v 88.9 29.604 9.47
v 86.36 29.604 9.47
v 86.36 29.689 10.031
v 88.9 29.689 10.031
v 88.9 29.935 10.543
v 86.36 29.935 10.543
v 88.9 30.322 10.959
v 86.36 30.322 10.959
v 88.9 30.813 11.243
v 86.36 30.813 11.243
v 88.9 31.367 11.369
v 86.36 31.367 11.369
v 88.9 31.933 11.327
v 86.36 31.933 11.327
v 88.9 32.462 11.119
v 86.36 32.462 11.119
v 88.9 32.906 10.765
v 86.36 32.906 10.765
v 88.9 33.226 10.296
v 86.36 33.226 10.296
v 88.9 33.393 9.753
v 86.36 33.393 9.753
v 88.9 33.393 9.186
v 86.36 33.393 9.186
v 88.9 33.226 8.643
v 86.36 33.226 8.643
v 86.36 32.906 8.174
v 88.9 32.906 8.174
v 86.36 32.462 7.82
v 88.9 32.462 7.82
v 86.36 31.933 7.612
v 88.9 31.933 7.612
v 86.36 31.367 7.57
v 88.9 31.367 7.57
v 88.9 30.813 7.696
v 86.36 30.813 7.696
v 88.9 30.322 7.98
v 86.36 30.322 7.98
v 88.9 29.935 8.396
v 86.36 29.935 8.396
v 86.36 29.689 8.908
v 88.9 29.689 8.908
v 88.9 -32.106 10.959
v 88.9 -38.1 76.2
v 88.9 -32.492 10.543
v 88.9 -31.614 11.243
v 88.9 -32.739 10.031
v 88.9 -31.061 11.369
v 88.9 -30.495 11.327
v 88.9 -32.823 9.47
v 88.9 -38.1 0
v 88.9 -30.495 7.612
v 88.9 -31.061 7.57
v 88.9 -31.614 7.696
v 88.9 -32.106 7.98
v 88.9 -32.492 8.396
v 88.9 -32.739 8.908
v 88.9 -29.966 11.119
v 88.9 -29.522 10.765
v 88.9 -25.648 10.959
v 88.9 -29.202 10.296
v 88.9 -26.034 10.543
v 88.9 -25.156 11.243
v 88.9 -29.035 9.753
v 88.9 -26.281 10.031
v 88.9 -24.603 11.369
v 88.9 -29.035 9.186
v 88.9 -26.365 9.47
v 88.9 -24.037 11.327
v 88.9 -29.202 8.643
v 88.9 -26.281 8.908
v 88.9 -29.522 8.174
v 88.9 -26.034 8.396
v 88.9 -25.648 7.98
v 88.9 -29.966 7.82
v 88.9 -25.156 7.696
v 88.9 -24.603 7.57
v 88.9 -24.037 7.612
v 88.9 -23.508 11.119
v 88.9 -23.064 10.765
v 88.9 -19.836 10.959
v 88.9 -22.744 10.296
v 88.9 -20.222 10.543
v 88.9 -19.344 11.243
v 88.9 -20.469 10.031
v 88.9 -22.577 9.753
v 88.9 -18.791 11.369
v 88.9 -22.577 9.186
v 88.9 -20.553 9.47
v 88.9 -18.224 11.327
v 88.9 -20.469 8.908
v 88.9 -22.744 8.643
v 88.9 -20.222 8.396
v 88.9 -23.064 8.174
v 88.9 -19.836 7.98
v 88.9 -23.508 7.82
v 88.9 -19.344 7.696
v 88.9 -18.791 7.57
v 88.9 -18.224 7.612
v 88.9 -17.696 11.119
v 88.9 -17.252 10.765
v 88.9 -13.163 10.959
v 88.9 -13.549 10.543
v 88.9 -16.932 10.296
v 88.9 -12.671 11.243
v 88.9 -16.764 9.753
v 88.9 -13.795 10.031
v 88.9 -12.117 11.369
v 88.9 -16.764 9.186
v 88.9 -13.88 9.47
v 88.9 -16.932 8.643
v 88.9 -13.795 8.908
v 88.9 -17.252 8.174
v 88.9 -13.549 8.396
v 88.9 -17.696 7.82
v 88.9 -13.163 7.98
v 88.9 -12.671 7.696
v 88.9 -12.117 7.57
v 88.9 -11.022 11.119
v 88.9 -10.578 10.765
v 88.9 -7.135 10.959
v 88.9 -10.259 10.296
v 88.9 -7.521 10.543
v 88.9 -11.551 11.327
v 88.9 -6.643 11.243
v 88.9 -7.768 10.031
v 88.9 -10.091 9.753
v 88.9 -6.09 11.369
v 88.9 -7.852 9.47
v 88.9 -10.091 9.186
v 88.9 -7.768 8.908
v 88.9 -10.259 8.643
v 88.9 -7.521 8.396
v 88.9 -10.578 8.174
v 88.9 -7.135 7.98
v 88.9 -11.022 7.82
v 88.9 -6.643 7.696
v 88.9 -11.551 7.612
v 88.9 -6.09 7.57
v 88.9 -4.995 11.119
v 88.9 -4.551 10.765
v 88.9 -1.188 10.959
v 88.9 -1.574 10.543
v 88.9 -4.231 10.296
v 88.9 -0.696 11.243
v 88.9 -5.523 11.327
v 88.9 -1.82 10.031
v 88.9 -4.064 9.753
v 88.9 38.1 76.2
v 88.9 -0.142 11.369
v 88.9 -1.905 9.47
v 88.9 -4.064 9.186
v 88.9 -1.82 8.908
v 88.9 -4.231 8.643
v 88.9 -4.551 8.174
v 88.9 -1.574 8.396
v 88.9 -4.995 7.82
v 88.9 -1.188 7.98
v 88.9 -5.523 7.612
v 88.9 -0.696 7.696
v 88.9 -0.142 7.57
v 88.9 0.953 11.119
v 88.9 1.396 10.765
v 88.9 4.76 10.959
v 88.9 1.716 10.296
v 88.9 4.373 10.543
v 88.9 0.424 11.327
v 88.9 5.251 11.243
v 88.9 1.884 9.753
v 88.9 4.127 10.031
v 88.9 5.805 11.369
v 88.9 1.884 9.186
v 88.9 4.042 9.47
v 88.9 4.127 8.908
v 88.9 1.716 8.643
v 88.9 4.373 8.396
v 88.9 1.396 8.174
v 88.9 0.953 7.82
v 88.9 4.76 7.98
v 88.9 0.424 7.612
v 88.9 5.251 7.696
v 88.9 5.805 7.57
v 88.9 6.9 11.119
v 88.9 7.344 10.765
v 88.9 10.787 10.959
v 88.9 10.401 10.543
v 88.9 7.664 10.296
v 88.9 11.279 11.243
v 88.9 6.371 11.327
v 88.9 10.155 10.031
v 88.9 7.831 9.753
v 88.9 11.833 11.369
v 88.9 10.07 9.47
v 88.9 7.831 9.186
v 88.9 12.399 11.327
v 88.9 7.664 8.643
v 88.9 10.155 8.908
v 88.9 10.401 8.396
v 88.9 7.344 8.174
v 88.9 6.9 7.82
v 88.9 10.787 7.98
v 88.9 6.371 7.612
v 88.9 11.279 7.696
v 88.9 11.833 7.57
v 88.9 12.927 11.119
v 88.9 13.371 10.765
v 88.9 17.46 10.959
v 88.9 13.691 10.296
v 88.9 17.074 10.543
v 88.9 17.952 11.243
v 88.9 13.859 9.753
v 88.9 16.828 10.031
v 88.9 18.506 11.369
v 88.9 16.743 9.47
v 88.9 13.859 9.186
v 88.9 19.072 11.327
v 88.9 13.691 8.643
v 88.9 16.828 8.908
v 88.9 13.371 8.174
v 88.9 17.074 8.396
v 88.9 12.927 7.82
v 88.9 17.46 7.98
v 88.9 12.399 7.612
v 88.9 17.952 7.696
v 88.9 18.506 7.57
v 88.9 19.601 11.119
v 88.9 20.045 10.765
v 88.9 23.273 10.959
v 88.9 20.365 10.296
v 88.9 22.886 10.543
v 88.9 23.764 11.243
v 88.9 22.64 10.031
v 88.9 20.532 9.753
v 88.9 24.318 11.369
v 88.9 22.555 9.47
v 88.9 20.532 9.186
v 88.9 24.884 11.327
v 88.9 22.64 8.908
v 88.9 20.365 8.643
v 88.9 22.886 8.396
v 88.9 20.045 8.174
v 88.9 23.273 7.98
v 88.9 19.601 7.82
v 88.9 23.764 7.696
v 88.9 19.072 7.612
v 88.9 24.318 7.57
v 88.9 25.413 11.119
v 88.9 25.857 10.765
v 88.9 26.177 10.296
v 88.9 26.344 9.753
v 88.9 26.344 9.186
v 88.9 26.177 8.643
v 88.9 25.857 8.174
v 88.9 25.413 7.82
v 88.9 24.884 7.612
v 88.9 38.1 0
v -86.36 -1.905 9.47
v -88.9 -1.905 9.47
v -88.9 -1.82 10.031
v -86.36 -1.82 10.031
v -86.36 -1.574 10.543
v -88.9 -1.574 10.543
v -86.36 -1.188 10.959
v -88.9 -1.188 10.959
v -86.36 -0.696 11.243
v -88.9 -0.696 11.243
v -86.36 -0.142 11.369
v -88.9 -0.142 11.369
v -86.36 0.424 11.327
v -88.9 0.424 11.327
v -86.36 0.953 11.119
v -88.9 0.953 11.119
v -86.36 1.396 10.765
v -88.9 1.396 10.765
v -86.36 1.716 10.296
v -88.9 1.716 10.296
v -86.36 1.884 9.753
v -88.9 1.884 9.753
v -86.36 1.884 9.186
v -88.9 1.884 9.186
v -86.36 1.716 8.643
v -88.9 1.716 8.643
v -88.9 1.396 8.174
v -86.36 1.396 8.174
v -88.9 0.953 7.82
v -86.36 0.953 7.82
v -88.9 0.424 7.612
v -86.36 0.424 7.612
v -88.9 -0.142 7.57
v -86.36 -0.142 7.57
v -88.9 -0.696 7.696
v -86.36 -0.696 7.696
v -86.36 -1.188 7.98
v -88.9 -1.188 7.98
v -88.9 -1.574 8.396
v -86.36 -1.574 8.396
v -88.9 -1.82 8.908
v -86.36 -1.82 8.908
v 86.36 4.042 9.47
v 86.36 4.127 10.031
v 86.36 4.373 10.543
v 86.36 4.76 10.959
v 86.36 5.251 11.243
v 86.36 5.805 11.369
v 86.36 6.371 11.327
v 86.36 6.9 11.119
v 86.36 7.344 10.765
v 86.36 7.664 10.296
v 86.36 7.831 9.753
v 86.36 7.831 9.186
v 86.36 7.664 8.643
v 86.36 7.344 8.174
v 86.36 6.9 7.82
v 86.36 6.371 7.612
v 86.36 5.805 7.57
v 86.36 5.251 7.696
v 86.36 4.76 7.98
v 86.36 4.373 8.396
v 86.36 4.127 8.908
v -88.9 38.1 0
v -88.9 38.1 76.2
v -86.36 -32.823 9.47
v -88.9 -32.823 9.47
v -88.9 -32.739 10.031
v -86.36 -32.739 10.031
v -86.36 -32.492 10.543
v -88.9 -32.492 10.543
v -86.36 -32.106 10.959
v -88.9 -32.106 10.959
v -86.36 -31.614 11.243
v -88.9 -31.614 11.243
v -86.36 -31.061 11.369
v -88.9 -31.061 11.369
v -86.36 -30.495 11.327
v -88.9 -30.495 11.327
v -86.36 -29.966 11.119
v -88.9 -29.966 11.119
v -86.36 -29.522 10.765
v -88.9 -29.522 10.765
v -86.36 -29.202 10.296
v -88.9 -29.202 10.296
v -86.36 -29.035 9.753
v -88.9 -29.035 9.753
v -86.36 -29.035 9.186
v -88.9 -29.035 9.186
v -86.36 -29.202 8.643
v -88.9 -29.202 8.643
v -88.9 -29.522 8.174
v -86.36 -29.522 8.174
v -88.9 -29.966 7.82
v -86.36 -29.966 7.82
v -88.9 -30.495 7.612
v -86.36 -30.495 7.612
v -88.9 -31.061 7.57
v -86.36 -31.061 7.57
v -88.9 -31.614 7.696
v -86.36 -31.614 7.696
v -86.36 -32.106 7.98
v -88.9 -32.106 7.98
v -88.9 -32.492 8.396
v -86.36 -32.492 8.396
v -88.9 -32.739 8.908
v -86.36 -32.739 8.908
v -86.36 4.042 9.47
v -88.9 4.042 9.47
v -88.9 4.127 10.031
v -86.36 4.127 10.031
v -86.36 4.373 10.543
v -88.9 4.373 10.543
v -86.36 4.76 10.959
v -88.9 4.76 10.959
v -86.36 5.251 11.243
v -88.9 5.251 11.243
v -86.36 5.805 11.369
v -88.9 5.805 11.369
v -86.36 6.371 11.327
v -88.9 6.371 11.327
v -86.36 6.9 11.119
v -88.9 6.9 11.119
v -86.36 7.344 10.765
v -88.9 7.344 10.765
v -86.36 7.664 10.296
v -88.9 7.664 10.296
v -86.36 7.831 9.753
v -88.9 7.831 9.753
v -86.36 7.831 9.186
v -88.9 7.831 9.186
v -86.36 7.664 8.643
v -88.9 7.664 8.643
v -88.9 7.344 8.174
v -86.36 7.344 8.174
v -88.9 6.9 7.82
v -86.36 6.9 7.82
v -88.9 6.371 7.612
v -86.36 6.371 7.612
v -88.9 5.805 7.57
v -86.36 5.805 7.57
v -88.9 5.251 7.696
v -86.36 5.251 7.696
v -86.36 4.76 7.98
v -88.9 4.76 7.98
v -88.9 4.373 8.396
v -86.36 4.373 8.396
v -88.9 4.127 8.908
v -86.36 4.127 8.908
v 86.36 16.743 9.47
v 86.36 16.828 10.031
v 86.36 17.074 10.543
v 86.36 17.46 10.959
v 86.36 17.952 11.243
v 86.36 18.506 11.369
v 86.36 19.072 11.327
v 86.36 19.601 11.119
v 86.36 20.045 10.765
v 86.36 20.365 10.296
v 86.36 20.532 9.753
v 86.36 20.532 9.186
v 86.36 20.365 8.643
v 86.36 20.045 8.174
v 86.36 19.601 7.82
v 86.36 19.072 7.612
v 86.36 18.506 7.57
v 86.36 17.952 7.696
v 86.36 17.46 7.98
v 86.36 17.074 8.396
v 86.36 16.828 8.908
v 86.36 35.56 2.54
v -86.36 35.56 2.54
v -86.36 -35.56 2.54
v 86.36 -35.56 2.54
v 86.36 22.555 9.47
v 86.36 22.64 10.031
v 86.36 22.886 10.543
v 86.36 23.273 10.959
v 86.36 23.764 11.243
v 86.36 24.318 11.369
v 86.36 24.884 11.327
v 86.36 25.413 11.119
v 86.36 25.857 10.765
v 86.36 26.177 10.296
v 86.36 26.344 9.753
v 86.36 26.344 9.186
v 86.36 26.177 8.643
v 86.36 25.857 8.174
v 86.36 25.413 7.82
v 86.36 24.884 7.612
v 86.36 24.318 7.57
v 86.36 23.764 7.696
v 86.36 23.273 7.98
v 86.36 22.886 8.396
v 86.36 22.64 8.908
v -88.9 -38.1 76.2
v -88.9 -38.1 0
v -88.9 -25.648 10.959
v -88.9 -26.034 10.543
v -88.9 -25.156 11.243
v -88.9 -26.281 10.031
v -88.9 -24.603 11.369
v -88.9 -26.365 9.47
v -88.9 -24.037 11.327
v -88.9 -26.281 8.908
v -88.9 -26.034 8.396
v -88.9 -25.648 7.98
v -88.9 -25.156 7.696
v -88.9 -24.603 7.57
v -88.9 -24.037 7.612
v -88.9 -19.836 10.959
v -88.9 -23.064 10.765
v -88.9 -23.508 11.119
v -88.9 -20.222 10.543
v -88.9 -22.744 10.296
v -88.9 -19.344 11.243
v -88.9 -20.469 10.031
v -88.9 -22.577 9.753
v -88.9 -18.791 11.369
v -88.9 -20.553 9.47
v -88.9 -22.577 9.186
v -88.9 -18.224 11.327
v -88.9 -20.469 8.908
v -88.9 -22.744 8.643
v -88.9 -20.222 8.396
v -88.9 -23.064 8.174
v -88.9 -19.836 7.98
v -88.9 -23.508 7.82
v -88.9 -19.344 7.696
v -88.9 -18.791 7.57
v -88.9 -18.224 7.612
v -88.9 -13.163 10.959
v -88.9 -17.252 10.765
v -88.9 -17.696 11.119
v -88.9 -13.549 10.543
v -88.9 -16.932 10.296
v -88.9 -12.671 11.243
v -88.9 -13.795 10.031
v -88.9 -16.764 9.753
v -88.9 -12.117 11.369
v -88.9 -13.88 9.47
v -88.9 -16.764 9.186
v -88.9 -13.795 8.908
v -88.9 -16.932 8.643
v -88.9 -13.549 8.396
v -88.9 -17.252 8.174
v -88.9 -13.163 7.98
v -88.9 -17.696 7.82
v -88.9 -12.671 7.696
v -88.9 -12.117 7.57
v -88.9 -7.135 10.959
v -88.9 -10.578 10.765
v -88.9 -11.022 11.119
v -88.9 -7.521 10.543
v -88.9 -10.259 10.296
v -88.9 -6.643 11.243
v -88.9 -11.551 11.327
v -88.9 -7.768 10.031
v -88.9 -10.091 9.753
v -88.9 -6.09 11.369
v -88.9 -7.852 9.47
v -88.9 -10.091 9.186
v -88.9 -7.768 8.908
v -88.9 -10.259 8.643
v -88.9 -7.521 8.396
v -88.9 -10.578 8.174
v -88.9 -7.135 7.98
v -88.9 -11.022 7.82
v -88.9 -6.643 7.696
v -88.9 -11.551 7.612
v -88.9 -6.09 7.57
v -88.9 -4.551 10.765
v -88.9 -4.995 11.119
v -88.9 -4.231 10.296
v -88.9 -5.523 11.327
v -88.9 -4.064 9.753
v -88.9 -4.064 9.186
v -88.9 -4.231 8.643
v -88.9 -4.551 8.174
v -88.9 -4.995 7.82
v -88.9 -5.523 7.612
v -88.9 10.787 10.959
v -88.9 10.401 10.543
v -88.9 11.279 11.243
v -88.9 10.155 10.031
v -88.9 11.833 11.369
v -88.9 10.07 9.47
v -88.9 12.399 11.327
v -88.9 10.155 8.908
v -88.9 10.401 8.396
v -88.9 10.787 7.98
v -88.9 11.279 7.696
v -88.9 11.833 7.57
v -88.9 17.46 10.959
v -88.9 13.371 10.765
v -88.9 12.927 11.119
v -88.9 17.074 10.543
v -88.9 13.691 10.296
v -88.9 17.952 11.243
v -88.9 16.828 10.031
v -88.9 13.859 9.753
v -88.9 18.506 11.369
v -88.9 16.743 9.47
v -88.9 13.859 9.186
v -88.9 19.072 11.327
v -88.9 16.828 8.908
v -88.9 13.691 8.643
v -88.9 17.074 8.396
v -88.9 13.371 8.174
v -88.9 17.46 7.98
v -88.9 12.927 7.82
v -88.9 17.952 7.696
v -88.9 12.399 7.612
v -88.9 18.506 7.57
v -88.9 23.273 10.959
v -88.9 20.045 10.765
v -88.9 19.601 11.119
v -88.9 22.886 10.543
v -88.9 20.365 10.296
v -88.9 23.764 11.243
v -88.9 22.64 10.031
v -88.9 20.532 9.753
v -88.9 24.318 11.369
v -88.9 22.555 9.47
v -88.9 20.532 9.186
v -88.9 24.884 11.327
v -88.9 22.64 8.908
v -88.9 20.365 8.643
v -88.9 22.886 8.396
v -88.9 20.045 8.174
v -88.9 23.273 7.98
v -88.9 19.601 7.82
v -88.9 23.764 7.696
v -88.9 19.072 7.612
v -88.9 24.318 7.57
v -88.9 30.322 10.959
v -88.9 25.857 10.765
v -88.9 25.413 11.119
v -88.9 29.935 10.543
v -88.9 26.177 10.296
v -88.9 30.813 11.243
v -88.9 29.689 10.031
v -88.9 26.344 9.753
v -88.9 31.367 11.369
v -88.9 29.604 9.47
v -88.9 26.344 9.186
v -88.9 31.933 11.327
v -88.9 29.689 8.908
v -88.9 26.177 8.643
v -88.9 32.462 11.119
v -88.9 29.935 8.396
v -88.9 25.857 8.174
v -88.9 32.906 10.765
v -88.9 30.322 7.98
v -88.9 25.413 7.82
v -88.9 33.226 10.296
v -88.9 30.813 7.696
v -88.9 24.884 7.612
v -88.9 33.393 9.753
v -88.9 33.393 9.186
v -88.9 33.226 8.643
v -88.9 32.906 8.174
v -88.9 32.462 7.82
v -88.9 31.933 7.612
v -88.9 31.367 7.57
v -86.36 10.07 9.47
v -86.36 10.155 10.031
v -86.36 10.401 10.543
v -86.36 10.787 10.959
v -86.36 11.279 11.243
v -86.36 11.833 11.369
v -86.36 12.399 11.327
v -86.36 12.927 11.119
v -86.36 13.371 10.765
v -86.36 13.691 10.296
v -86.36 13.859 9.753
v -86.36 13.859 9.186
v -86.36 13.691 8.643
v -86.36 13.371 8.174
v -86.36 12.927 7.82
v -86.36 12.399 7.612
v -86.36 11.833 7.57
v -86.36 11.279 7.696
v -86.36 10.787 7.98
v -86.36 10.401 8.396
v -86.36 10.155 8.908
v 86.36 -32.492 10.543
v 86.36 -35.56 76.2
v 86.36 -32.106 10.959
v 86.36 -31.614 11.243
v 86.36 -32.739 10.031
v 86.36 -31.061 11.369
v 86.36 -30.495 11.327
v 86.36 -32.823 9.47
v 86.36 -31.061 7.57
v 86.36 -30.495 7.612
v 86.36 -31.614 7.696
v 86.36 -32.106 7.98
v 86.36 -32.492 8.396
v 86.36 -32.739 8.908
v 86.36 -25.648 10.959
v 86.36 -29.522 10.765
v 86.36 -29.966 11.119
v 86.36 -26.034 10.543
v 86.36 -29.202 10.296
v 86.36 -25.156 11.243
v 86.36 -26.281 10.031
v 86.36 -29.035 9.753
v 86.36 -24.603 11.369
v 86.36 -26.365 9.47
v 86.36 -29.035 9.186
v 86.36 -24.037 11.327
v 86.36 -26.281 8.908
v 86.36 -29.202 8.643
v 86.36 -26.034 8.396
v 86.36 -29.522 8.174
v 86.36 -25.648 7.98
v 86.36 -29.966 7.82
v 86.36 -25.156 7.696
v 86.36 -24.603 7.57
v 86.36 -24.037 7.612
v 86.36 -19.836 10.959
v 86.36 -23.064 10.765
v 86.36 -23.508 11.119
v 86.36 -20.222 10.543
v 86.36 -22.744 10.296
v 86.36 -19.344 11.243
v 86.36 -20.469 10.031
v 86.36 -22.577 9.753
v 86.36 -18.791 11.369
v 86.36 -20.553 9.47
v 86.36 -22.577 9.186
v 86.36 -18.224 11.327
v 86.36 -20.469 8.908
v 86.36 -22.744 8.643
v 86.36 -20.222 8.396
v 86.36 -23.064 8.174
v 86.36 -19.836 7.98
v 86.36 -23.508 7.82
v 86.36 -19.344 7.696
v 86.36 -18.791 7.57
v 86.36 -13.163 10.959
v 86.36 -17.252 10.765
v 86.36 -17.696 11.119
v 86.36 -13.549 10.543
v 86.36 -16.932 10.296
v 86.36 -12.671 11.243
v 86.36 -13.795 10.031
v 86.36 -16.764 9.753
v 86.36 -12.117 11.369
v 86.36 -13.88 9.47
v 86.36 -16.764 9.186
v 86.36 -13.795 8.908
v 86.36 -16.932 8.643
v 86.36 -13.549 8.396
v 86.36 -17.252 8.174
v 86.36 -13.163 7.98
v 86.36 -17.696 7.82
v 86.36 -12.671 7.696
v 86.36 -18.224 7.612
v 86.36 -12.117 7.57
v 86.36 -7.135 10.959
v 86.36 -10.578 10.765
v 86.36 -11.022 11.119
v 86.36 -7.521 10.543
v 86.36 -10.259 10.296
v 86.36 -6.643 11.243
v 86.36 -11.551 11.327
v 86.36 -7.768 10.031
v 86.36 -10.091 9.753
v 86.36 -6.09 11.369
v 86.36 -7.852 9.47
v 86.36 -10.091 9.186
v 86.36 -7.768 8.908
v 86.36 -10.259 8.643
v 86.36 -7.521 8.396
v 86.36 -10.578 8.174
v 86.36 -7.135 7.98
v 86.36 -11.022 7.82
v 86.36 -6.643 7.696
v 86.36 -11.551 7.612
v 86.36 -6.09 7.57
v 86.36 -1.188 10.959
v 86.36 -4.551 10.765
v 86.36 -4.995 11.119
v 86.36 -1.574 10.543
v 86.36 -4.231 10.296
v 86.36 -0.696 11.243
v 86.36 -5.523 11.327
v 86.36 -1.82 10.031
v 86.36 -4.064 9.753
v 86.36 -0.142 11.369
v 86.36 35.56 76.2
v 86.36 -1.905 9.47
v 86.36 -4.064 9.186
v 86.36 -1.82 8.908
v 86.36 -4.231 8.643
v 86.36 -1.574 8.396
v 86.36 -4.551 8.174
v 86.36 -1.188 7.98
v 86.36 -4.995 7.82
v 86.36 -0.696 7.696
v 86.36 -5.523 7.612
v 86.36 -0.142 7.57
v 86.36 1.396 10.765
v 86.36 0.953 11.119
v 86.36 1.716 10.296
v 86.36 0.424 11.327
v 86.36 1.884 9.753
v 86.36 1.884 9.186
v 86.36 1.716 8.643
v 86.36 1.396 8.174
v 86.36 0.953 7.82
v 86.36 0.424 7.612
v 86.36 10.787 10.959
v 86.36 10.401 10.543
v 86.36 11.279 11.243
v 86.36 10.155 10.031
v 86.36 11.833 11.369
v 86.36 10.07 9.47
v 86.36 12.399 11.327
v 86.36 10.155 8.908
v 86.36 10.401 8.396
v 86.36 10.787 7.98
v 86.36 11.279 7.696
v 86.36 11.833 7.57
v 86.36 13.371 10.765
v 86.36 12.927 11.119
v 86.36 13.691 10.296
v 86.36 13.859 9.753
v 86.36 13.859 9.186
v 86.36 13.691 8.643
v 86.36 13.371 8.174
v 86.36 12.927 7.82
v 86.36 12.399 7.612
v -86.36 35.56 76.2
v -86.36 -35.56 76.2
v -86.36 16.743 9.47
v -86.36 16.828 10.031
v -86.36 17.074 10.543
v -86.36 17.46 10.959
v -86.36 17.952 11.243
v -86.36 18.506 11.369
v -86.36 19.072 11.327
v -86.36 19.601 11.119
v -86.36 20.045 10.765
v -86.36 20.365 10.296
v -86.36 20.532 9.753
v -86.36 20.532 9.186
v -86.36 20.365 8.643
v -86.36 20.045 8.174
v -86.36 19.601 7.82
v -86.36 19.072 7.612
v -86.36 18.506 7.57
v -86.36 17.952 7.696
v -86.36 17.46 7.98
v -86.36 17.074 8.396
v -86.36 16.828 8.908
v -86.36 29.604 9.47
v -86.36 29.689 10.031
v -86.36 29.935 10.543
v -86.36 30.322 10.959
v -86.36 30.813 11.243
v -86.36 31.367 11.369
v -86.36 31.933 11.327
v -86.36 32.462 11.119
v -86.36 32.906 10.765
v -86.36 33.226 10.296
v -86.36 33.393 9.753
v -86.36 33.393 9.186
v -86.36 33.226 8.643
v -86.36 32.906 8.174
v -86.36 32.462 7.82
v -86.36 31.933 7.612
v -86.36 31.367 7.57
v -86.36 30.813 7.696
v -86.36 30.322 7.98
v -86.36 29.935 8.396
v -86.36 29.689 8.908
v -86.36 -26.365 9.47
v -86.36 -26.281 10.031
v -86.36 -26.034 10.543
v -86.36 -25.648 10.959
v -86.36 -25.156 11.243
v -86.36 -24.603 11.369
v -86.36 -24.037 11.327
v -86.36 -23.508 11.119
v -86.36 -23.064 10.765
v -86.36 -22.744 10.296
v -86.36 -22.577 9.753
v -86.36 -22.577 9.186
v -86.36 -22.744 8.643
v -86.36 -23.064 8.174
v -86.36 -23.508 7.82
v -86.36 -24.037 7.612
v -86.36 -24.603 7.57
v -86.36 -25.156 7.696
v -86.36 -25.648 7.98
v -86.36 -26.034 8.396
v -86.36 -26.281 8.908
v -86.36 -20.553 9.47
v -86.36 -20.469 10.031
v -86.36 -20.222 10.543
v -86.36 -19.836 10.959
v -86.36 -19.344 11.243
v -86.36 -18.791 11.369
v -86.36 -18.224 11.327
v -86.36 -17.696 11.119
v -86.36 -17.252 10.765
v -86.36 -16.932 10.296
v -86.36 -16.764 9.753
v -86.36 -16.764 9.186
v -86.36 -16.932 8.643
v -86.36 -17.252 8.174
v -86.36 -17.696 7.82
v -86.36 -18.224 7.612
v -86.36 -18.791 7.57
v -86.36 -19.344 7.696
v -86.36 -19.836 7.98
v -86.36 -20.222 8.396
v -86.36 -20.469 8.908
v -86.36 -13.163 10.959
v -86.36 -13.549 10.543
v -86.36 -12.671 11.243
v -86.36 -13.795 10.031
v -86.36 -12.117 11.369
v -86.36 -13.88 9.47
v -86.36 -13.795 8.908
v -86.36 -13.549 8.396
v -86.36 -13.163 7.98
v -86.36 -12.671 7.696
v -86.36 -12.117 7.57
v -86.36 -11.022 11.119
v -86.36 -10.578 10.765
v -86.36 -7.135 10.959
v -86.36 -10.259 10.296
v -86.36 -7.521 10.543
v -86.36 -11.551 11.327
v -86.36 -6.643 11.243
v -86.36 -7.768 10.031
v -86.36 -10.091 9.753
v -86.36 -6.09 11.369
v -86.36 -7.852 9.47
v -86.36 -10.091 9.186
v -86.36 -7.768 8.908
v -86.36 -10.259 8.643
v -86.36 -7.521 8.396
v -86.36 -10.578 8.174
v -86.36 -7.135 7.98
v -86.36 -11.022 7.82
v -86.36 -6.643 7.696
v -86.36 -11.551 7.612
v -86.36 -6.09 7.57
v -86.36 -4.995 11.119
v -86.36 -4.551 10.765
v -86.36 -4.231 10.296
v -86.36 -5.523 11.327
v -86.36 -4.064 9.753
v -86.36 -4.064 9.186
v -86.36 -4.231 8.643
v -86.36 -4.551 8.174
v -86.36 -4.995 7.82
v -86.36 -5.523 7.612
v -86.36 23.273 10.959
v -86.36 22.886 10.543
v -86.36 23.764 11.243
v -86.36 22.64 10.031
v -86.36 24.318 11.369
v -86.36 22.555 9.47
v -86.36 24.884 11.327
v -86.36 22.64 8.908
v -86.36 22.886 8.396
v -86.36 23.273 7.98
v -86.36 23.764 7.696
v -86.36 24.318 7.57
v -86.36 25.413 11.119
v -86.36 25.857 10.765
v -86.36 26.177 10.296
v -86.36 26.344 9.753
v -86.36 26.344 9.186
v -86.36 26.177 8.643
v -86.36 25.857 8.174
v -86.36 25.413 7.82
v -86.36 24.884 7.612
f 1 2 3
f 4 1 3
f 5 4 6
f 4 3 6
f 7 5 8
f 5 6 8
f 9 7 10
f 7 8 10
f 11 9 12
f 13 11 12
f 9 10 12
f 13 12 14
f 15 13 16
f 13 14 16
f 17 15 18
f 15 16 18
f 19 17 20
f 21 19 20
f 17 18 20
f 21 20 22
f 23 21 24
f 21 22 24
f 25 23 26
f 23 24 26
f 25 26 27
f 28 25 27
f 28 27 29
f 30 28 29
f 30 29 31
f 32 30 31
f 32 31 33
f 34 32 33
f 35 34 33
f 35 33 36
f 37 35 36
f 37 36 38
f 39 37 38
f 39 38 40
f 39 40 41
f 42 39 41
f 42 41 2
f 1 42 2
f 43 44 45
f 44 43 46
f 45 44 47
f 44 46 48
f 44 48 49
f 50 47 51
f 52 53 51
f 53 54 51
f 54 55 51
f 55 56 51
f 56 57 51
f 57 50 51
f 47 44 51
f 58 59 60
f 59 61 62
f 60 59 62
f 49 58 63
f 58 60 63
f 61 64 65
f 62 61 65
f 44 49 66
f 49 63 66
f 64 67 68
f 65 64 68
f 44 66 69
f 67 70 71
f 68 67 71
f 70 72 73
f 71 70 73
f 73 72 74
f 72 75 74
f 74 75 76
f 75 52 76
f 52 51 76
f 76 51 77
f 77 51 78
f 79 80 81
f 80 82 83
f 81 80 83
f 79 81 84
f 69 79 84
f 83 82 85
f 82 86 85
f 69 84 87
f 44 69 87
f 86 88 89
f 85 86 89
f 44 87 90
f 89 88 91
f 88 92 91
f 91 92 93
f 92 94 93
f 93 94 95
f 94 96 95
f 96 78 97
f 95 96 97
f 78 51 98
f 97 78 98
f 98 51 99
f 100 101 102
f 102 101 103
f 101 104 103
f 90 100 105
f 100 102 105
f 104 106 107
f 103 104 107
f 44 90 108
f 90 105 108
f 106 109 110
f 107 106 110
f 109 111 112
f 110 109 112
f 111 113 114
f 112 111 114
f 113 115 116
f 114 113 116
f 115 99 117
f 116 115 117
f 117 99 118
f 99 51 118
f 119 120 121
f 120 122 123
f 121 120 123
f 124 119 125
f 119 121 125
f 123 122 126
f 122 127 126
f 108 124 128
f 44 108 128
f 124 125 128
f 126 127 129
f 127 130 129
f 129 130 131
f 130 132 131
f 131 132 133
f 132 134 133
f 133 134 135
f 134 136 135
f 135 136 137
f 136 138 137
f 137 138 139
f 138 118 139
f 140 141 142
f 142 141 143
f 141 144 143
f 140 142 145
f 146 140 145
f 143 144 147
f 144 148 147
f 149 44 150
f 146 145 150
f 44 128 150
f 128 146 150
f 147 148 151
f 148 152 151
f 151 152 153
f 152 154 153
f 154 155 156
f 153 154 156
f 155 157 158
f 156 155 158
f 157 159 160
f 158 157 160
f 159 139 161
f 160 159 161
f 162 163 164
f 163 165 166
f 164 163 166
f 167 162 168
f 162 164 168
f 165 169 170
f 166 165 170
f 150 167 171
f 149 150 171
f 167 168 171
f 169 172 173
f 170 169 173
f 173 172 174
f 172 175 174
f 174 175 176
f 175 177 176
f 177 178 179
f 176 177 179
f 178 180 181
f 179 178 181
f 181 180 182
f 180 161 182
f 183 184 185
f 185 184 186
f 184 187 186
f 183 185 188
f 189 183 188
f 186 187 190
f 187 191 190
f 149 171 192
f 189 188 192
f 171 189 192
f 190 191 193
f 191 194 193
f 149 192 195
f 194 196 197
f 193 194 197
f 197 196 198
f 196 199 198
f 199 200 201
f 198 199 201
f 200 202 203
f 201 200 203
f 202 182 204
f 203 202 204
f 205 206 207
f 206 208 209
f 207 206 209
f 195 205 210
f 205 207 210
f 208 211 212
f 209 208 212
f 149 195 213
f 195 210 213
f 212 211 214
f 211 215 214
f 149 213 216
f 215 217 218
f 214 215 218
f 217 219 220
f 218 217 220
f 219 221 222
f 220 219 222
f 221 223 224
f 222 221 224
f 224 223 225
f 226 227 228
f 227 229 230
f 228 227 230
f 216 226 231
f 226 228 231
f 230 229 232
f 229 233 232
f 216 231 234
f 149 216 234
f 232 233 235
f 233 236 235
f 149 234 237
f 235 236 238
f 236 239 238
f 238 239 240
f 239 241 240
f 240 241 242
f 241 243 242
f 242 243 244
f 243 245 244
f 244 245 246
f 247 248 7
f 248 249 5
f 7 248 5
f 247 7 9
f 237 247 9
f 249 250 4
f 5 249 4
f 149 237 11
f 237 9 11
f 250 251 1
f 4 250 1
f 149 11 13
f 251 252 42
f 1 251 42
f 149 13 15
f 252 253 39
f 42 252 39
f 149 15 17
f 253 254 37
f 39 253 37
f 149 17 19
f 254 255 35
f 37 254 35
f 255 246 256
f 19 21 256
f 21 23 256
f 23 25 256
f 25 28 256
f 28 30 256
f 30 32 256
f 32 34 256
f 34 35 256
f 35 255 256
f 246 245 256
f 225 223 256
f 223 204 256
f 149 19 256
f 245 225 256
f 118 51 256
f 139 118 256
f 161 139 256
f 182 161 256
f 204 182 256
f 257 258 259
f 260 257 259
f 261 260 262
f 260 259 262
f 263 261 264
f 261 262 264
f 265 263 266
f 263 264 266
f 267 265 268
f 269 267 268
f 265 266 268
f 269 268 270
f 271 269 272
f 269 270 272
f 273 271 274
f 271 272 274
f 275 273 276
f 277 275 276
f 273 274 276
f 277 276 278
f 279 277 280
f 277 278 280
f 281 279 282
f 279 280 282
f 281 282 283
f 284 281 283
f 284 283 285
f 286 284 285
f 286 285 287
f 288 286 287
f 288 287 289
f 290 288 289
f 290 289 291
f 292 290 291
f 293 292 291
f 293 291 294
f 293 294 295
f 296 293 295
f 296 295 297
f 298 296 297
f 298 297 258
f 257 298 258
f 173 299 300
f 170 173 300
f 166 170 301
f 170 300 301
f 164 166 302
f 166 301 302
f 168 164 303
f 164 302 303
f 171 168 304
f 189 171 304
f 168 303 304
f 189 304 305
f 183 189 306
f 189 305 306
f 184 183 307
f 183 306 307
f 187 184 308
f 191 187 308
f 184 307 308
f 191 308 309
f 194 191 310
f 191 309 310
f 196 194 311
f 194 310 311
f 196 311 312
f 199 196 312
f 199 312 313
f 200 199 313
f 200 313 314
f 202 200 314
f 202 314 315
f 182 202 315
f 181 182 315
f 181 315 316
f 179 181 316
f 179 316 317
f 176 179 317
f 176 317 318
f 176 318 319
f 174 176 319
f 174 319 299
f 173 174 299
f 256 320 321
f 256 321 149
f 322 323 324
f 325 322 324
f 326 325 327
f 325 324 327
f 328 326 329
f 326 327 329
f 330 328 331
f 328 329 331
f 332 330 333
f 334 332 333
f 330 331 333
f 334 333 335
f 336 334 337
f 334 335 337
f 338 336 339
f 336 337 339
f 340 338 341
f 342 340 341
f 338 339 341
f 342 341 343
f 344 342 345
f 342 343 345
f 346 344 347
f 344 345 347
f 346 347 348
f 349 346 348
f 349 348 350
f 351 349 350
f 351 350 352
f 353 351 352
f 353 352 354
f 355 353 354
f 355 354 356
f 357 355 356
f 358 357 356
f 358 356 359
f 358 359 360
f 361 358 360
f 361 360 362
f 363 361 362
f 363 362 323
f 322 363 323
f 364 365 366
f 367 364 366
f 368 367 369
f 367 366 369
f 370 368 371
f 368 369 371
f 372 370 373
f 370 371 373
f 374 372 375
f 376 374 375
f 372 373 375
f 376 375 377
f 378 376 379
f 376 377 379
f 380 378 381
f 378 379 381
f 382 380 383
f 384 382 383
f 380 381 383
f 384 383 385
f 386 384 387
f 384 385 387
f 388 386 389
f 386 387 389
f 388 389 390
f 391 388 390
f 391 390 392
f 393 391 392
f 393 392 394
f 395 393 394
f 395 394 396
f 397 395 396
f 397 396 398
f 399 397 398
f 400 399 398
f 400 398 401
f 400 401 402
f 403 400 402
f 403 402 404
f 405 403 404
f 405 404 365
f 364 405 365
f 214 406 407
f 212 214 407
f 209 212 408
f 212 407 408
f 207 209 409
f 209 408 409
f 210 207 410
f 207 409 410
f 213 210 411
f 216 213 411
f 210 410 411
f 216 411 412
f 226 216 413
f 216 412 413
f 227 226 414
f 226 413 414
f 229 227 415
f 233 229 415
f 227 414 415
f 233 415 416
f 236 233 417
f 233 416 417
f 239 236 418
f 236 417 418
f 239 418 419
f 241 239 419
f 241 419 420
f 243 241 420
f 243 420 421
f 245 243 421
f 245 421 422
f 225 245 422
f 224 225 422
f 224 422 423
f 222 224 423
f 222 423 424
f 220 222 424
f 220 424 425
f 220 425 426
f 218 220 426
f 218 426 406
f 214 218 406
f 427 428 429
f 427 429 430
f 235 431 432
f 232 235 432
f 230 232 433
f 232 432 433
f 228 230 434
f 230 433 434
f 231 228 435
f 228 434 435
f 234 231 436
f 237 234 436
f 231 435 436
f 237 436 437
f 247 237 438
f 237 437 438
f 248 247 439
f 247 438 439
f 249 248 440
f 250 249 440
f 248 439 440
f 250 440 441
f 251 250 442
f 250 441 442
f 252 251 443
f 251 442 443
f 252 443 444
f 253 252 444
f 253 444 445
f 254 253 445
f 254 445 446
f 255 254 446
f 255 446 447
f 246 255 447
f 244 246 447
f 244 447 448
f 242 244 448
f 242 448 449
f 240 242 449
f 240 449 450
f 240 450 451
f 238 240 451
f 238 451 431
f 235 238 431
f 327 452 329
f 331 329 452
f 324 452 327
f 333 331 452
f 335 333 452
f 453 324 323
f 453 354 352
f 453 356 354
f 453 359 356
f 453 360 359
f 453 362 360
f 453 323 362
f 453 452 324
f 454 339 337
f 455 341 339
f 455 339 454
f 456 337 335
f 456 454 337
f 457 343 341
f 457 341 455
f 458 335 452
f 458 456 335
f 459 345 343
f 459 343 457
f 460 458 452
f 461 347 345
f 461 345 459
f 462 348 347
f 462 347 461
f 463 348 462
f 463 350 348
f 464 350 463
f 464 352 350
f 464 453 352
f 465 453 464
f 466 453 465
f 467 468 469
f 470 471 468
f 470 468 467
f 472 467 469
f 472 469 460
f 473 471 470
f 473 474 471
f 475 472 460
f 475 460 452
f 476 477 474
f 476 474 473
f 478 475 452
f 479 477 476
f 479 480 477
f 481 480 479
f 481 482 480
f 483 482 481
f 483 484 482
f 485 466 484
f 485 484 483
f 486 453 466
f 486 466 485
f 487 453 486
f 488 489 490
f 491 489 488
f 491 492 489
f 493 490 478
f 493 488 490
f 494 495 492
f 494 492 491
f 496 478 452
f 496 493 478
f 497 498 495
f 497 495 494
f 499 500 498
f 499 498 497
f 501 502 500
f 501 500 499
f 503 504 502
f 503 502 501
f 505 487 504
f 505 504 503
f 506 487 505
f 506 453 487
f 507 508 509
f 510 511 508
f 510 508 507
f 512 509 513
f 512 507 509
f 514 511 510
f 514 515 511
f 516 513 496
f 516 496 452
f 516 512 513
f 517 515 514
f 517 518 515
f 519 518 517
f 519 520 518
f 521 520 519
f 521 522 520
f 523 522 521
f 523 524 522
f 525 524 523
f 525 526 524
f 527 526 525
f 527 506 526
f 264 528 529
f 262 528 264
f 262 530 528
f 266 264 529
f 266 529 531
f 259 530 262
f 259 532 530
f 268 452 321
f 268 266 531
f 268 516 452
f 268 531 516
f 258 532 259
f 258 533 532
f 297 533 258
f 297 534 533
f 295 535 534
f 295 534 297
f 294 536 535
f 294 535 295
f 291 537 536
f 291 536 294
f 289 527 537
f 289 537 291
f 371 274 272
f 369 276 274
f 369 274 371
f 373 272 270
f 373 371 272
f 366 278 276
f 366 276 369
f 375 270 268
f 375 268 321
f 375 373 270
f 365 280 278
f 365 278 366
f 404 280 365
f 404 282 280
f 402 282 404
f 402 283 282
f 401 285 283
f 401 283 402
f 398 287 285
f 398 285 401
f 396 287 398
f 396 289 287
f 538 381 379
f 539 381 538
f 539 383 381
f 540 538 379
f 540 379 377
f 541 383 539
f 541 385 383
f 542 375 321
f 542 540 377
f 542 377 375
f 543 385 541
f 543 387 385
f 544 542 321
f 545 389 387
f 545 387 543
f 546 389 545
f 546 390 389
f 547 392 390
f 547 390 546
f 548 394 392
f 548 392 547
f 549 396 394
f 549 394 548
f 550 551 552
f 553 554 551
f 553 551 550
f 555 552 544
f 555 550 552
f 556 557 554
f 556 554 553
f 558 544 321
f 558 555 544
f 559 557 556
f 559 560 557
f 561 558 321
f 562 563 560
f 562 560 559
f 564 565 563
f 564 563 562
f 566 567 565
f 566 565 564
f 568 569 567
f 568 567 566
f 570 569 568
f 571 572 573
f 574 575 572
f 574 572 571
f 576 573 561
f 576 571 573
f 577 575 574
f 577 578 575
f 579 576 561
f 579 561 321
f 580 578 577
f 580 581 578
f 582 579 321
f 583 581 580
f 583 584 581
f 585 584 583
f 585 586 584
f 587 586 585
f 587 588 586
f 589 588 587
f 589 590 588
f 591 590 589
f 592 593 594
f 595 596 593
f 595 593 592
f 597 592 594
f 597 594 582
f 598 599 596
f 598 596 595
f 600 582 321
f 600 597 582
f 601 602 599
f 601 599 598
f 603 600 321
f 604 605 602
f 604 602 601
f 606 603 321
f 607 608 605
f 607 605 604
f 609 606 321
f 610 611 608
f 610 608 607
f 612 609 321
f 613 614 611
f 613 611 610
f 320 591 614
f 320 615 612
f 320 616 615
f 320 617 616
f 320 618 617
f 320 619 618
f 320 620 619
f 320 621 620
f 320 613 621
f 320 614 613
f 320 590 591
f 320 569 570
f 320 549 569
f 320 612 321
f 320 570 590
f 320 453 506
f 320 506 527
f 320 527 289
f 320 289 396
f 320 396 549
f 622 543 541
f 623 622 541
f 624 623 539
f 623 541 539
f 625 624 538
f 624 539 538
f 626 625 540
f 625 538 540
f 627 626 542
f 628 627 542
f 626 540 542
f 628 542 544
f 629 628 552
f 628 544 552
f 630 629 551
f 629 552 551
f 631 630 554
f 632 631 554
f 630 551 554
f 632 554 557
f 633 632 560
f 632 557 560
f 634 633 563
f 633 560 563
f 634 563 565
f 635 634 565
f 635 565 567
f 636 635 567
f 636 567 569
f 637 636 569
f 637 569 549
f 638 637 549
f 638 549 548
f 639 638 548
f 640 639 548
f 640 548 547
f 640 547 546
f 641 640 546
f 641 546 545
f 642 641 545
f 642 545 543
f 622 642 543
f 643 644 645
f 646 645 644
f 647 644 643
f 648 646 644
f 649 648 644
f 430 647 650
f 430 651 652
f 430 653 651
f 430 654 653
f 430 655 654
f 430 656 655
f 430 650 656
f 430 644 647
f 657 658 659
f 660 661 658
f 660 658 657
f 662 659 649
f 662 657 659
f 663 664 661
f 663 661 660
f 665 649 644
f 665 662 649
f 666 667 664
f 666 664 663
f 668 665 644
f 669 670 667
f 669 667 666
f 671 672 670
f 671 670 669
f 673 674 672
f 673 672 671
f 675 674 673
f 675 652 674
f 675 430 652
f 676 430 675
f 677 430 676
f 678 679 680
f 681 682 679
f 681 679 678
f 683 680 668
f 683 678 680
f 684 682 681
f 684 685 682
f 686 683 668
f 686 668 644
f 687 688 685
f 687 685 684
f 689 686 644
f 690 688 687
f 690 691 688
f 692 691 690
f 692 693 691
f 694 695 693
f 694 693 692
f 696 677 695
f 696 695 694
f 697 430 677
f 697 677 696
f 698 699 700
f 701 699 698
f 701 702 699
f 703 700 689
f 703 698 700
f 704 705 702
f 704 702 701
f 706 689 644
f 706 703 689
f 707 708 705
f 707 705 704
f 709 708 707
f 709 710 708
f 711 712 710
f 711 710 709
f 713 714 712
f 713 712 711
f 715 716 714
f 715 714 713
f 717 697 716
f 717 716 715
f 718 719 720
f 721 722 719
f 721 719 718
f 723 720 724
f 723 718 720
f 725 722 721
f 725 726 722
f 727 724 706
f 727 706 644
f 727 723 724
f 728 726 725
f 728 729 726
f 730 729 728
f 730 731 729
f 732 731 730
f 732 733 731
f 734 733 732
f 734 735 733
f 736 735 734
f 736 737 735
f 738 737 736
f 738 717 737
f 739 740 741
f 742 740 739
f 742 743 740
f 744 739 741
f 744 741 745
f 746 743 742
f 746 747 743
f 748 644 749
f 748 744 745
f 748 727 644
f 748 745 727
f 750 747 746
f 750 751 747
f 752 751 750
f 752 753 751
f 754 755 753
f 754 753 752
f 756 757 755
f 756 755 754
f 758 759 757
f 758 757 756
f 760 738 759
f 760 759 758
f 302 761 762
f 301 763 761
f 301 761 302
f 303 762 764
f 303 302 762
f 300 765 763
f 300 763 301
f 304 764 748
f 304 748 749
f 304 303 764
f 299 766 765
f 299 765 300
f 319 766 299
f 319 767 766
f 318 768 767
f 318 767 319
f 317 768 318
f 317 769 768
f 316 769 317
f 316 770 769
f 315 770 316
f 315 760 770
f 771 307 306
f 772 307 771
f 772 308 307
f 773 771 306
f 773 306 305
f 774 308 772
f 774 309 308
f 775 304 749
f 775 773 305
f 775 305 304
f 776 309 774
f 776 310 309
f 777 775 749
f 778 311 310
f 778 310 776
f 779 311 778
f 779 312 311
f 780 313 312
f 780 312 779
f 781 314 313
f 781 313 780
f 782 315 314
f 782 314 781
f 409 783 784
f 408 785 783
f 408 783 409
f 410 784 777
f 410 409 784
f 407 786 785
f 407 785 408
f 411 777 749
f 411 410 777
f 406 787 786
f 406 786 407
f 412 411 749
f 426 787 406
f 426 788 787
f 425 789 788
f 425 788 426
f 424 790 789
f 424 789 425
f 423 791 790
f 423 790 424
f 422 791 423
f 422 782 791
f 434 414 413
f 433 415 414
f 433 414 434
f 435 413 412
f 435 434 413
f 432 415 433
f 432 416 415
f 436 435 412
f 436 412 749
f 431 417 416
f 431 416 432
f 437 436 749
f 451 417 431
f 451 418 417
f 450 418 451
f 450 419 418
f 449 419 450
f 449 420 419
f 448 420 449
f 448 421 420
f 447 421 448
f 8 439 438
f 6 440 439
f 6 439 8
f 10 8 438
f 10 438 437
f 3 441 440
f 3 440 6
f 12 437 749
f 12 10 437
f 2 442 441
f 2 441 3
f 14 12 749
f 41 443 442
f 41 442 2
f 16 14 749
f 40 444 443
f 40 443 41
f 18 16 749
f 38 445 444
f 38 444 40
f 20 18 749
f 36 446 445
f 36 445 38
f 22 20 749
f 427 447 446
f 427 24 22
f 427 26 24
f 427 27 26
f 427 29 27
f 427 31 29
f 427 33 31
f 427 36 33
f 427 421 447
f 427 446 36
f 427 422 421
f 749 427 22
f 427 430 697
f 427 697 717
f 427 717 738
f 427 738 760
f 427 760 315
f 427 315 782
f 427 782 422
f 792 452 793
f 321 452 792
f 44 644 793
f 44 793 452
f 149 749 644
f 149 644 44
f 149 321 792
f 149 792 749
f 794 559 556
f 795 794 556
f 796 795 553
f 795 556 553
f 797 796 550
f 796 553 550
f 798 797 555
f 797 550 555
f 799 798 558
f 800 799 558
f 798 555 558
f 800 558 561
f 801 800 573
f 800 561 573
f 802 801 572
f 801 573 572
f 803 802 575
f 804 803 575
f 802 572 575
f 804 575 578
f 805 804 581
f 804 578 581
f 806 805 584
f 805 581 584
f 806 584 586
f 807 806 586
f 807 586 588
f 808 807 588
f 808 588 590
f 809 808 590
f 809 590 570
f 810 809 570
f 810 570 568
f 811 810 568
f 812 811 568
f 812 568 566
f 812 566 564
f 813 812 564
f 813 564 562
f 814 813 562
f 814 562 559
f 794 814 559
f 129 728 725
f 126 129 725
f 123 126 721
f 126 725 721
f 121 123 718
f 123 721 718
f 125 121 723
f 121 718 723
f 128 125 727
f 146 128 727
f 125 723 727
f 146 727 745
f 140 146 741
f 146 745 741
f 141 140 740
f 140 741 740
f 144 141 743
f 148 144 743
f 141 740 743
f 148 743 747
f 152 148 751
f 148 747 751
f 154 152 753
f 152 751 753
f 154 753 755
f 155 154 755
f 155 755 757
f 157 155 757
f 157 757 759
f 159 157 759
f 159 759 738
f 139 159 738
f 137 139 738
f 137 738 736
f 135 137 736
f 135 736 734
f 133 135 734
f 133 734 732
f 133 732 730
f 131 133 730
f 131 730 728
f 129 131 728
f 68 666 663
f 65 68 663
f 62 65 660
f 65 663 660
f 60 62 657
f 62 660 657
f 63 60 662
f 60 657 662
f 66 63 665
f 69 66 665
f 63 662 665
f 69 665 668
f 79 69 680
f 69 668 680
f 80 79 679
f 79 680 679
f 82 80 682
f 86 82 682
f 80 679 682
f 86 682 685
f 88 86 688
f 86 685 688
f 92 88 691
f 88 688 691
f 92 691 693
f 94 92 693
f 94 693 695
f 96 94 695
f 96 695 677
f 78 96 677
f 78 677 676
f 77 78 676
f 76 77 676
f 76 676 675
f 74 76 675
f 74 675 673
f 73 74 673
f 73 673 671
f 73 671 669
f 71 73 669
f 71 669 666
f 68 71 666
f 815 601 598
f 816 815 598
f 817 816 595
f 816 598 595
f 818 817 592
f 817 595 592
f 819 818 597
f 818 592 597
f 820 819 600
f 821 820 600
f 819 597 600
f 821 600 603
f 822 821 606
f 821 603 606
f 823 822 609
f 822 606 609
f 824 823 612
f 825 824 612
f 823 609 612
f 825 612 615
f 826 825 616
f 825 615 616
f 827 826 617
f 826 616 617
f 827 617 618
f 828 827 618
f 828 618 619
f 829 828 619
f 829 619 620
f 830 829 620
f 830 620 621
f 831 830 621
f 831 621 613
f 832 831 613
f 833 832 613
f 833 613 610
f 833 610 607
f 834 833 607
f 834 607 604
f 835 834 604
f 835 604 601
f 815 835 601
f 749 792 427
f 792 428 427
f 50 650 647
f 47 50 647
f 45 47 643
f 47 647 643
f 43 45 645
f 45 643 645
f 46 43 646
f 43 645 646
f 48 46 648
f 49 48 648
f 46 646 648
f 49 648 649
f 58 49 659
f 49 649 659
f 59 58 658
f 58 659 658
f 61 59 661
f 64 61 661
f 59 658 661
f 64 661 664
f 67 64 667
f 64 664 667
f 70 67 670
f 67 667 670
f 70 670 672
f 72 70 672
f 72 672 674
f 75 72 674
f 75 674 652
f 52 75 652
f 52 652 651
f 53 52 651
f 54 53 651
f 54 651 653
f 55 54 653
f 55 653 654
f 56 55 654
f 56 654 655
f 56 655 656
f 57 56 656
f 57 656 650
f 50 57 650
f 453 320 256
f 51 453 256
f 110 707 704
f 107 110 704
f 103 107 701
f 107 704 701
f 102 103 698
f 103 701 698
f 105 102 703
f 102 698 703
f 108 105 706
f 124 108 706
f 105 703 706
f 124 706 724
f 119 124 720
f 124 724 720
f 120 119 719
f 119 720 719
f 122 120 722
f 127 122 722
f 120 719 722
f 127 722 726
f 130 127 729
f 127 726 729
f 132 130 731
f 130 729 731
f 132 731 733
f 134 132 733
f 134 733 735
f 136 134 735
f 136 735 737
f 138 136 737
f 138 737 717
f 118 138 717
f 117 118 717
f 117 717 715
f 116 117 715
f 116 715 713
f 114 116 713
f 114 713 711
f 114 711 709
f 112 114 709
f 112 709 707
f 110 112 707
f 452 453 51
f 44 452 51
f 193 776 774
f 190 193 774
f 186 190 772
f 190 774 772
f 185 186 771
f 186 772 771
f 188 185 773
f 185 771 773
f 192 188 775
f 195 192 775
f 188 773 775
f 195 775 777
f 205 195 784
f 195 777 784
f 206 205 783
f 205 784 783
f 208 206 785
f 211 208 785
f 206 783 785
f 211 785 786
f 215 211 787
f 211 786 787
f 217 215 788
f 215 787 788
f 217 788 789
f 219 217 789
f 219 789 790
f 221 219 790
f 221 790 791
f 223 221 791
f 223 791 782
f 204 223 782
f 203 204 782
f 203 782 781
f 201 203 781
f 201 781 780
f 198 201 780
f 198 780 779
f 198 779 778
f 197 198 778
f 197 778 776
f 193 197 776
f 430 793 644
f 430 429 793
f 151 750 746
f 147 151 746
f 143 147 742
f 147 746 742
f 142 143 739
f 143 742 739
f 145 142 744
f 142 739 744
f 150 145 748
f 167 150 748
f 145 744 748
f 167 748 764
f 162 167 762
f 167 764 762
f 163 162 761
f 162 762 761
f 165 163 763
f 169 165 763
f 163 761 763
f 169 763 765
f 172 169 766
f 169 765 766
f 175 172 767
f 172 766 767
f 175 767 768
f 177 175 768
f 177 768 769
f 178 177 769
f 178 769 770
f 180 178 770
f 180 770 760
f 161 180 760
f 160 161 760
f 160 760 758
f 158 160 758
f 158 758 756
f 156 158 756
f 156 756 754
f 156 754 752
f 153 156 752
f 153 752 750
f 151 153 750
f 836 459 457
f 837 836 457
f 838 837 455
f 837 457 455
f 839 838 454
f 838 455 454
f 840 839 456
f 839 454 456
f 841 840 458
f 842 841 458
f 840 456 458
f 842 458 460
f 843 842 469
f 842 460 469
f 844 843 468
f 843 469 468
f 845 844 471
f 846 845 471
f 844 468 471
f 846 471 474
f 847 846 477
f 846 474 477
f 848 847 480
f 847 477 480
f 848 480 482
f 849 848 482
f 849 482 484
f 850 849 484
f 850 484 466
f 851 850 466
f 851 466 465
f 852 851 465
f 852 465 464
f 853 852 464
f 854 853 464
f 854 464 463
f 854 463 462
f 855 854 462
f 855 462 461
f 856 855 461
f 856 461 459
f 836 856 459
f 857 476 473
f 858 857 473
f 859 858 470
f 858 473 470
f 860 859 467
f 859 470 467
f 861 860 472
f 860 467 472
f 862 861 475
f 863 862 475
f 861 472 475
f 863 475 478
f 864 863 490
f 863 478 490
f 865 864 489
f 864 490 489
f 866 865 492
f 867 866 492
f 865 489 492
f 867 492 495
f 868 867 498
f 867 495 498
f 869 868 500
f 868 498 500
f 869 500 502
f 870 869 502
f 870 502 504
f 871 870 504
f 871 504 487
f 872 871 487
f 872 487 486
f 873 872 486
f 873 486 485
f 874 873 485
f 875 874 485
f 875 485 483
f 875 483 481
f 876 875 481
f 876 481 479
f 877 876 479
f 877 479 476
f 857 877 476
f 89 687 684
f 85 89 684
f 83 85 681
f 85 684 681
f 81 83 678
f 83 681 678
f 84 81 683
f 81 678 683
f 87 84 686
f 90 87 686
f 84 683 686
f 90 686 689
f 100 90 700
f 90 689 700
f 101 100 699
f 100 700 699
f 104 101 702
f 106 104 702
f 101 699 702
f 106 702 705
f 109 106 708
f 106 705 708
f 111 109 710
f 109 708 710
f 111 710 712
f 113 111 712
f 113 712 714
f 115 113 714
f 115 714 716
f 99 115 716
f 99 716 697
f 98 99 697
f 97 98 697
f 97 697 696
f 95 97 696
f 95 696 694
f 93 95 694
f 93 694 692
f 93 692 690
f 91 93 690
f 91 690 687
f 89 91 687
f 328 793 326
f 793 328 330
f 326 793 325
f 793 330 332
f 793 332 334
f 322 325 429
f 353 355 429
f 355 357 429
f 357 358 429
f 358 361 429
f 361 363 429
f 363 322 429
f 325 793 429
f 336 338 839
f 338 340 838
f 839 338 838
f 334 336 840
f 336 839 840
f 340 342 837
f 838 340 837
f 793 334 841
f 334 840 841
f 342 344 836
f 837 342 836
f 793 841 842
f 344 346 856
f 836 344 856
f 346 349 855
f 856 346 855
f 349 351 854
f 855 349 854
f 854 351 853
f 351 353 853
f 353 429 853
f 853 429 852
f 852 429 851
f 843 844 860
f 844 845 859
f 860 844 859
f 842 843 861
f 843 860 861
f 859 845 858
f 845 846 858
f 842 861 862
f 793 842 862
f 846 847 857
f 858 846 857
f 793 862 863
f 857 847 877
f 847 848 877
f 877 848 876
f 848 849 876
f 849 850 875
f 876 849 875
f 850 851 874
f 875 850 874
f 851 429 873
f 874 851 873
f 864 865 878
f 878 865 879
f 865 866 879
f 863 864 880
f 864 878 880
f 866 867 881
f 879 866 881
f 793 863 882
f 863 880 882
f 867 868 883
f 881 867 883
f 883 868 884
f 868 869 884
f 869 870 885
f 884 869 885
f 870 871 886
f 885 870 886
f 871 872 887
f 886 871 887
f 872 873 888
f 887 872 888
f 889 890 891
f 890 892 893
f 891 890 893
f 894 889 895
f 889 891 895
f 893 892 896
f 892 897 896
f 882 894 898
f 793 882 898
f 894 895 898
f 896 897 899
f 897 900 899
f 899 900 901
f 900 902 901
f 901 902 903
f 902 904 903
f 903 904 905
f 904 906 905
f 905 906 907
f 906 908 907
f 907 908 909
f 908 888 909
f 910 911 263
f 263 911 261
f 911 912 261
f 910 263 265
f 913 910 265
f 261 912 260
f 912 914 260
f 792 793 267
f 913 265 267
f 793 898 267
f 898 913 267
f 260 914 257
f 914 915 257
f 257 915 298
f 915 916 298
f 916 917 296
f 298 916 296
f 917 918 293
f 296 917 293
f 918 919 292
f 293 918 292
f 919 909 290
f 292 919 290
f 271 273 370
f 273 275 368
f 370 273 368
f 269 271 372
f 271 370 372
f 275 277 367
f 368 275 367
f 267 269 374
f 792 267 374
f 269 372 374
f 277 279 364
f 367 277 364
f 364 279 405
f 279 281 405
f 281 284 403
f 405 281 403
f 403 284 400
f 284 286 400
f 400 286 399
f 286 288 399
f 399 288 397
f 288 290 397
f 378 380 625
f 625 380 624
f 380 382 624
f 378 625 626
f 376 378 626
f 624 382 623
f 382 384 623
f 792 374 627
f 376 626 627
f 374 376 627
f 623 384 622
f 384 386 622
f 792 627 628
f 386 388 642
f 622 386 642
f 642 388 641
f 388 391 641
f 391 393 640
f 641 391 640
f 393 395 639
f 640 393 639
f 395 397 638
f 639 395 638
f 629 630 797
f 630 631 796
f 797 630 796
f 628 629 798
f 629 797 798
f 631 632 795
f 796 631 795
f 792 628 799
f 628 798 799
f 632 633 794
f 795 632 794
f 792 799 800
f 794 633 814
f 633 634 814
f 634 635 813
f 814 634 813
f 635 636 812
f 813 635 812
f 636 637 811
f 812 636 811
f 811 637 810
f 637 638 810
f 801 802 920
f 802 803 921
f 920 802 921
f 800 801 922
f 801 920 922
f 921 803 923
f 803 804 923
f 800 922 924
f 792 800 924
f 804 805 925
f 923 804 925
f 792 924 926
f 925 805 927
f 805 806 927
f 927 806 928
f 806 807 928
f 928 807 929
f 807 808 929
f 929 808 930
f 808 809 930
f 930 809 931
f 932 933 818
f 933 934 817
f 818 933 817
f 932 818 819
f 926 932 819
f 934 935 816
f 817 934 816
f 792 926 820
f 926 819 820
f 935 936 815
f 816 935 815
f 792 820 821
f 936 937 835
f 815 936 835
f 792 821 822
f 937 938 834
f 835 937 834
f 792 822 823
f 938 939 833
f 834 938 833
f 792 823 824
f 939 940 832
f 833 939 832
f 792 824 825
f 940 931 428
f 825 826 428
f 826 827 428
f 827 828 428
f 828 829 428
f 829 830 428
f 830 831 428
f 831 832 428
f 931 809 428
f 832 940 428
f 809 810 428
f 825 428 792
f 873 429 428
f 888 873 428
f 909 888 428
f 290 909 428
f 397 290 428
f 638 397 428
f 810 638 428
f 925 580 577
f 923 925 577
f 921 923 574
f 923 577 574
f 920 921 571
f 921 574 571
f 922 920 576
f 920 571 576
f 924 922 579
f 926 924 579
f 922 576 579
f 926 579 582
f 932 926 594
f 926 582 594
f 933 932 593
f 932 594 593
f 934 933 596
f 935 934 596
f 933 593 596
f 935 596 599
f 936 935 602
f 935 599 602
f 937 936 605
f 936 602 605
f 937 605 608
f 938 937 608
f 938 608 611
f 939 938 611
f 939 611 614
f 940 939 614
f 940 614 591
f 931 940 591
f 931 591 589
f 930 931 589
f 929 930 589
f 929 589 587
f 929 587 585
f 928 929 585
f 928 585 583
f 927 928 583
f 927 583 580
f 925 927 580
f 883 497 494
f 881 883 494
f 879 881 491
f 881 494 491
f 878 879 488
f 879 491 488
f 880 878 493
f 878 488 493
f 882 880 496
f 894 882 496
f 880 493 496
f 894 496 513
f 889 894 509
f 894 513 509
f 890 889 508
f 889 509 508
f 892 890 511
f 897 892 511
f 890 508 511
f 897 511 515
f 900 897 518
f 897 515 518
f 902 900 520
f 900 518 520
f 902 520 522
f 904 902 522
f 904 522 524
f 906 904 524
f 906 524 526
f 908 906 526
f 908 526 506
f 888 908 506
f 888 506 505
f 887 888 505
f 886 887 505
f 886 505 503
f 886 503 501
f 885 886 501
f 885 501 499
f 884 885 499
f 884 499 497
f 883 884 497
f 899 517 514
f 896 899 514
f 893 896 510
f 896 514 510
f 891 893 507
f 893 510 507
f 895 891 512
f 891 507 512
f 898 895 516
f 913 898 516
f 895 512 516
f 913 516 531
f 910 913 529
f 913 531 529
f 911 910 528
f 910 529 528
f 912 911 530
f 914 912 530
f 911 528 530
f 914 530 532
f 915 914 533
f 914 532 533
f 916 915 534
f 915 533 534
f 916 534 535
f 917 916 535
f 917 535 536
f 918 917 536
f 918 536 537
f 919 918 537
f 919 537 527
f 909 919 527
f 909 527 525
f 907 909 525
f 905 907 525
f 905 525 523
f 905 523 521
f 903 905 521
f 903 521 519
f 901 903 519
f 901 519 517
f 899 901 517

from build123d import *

# Parameters (mm, degrees)
F0_W     = 177.8
F0_H     = 76.2
F1_DEPTH = 76.2
F3_T     = -2.54
F4_D     = 3.81


with BuildPart() as f1:
    # F0 (on Top) → F1 (new body)
    with BuildSketch(Plane.XY):
        Rectangle(F0_W, F0_H)
    extrude(amount=F1_DEPTH)

    # F3
    f3_openings = [f1.faces().sort_by_distance(p)[0] for p in [
        (0, 0, 76.2),
    ]]
    offset(amount=F3_T, openings=f3_openings)

    # F4 (through all)
    with Locations(Plane.YZ.offset(88.9)):
        with Locations((-30.918453, 9.469561), (-24.460413, 9.469561), (-18.648177, 9.469561), (-5.947364, 9.469561), (-11.974867, 9.469561), (0, 9.469561), (5.947364, 9.469561), (11.974867, 9.469561), (18.648177, 9.469561), (24.460413, 9.469561), (31.509273, 9.469561)):
            Hole(F4_D / 2)


solid = f1.part
